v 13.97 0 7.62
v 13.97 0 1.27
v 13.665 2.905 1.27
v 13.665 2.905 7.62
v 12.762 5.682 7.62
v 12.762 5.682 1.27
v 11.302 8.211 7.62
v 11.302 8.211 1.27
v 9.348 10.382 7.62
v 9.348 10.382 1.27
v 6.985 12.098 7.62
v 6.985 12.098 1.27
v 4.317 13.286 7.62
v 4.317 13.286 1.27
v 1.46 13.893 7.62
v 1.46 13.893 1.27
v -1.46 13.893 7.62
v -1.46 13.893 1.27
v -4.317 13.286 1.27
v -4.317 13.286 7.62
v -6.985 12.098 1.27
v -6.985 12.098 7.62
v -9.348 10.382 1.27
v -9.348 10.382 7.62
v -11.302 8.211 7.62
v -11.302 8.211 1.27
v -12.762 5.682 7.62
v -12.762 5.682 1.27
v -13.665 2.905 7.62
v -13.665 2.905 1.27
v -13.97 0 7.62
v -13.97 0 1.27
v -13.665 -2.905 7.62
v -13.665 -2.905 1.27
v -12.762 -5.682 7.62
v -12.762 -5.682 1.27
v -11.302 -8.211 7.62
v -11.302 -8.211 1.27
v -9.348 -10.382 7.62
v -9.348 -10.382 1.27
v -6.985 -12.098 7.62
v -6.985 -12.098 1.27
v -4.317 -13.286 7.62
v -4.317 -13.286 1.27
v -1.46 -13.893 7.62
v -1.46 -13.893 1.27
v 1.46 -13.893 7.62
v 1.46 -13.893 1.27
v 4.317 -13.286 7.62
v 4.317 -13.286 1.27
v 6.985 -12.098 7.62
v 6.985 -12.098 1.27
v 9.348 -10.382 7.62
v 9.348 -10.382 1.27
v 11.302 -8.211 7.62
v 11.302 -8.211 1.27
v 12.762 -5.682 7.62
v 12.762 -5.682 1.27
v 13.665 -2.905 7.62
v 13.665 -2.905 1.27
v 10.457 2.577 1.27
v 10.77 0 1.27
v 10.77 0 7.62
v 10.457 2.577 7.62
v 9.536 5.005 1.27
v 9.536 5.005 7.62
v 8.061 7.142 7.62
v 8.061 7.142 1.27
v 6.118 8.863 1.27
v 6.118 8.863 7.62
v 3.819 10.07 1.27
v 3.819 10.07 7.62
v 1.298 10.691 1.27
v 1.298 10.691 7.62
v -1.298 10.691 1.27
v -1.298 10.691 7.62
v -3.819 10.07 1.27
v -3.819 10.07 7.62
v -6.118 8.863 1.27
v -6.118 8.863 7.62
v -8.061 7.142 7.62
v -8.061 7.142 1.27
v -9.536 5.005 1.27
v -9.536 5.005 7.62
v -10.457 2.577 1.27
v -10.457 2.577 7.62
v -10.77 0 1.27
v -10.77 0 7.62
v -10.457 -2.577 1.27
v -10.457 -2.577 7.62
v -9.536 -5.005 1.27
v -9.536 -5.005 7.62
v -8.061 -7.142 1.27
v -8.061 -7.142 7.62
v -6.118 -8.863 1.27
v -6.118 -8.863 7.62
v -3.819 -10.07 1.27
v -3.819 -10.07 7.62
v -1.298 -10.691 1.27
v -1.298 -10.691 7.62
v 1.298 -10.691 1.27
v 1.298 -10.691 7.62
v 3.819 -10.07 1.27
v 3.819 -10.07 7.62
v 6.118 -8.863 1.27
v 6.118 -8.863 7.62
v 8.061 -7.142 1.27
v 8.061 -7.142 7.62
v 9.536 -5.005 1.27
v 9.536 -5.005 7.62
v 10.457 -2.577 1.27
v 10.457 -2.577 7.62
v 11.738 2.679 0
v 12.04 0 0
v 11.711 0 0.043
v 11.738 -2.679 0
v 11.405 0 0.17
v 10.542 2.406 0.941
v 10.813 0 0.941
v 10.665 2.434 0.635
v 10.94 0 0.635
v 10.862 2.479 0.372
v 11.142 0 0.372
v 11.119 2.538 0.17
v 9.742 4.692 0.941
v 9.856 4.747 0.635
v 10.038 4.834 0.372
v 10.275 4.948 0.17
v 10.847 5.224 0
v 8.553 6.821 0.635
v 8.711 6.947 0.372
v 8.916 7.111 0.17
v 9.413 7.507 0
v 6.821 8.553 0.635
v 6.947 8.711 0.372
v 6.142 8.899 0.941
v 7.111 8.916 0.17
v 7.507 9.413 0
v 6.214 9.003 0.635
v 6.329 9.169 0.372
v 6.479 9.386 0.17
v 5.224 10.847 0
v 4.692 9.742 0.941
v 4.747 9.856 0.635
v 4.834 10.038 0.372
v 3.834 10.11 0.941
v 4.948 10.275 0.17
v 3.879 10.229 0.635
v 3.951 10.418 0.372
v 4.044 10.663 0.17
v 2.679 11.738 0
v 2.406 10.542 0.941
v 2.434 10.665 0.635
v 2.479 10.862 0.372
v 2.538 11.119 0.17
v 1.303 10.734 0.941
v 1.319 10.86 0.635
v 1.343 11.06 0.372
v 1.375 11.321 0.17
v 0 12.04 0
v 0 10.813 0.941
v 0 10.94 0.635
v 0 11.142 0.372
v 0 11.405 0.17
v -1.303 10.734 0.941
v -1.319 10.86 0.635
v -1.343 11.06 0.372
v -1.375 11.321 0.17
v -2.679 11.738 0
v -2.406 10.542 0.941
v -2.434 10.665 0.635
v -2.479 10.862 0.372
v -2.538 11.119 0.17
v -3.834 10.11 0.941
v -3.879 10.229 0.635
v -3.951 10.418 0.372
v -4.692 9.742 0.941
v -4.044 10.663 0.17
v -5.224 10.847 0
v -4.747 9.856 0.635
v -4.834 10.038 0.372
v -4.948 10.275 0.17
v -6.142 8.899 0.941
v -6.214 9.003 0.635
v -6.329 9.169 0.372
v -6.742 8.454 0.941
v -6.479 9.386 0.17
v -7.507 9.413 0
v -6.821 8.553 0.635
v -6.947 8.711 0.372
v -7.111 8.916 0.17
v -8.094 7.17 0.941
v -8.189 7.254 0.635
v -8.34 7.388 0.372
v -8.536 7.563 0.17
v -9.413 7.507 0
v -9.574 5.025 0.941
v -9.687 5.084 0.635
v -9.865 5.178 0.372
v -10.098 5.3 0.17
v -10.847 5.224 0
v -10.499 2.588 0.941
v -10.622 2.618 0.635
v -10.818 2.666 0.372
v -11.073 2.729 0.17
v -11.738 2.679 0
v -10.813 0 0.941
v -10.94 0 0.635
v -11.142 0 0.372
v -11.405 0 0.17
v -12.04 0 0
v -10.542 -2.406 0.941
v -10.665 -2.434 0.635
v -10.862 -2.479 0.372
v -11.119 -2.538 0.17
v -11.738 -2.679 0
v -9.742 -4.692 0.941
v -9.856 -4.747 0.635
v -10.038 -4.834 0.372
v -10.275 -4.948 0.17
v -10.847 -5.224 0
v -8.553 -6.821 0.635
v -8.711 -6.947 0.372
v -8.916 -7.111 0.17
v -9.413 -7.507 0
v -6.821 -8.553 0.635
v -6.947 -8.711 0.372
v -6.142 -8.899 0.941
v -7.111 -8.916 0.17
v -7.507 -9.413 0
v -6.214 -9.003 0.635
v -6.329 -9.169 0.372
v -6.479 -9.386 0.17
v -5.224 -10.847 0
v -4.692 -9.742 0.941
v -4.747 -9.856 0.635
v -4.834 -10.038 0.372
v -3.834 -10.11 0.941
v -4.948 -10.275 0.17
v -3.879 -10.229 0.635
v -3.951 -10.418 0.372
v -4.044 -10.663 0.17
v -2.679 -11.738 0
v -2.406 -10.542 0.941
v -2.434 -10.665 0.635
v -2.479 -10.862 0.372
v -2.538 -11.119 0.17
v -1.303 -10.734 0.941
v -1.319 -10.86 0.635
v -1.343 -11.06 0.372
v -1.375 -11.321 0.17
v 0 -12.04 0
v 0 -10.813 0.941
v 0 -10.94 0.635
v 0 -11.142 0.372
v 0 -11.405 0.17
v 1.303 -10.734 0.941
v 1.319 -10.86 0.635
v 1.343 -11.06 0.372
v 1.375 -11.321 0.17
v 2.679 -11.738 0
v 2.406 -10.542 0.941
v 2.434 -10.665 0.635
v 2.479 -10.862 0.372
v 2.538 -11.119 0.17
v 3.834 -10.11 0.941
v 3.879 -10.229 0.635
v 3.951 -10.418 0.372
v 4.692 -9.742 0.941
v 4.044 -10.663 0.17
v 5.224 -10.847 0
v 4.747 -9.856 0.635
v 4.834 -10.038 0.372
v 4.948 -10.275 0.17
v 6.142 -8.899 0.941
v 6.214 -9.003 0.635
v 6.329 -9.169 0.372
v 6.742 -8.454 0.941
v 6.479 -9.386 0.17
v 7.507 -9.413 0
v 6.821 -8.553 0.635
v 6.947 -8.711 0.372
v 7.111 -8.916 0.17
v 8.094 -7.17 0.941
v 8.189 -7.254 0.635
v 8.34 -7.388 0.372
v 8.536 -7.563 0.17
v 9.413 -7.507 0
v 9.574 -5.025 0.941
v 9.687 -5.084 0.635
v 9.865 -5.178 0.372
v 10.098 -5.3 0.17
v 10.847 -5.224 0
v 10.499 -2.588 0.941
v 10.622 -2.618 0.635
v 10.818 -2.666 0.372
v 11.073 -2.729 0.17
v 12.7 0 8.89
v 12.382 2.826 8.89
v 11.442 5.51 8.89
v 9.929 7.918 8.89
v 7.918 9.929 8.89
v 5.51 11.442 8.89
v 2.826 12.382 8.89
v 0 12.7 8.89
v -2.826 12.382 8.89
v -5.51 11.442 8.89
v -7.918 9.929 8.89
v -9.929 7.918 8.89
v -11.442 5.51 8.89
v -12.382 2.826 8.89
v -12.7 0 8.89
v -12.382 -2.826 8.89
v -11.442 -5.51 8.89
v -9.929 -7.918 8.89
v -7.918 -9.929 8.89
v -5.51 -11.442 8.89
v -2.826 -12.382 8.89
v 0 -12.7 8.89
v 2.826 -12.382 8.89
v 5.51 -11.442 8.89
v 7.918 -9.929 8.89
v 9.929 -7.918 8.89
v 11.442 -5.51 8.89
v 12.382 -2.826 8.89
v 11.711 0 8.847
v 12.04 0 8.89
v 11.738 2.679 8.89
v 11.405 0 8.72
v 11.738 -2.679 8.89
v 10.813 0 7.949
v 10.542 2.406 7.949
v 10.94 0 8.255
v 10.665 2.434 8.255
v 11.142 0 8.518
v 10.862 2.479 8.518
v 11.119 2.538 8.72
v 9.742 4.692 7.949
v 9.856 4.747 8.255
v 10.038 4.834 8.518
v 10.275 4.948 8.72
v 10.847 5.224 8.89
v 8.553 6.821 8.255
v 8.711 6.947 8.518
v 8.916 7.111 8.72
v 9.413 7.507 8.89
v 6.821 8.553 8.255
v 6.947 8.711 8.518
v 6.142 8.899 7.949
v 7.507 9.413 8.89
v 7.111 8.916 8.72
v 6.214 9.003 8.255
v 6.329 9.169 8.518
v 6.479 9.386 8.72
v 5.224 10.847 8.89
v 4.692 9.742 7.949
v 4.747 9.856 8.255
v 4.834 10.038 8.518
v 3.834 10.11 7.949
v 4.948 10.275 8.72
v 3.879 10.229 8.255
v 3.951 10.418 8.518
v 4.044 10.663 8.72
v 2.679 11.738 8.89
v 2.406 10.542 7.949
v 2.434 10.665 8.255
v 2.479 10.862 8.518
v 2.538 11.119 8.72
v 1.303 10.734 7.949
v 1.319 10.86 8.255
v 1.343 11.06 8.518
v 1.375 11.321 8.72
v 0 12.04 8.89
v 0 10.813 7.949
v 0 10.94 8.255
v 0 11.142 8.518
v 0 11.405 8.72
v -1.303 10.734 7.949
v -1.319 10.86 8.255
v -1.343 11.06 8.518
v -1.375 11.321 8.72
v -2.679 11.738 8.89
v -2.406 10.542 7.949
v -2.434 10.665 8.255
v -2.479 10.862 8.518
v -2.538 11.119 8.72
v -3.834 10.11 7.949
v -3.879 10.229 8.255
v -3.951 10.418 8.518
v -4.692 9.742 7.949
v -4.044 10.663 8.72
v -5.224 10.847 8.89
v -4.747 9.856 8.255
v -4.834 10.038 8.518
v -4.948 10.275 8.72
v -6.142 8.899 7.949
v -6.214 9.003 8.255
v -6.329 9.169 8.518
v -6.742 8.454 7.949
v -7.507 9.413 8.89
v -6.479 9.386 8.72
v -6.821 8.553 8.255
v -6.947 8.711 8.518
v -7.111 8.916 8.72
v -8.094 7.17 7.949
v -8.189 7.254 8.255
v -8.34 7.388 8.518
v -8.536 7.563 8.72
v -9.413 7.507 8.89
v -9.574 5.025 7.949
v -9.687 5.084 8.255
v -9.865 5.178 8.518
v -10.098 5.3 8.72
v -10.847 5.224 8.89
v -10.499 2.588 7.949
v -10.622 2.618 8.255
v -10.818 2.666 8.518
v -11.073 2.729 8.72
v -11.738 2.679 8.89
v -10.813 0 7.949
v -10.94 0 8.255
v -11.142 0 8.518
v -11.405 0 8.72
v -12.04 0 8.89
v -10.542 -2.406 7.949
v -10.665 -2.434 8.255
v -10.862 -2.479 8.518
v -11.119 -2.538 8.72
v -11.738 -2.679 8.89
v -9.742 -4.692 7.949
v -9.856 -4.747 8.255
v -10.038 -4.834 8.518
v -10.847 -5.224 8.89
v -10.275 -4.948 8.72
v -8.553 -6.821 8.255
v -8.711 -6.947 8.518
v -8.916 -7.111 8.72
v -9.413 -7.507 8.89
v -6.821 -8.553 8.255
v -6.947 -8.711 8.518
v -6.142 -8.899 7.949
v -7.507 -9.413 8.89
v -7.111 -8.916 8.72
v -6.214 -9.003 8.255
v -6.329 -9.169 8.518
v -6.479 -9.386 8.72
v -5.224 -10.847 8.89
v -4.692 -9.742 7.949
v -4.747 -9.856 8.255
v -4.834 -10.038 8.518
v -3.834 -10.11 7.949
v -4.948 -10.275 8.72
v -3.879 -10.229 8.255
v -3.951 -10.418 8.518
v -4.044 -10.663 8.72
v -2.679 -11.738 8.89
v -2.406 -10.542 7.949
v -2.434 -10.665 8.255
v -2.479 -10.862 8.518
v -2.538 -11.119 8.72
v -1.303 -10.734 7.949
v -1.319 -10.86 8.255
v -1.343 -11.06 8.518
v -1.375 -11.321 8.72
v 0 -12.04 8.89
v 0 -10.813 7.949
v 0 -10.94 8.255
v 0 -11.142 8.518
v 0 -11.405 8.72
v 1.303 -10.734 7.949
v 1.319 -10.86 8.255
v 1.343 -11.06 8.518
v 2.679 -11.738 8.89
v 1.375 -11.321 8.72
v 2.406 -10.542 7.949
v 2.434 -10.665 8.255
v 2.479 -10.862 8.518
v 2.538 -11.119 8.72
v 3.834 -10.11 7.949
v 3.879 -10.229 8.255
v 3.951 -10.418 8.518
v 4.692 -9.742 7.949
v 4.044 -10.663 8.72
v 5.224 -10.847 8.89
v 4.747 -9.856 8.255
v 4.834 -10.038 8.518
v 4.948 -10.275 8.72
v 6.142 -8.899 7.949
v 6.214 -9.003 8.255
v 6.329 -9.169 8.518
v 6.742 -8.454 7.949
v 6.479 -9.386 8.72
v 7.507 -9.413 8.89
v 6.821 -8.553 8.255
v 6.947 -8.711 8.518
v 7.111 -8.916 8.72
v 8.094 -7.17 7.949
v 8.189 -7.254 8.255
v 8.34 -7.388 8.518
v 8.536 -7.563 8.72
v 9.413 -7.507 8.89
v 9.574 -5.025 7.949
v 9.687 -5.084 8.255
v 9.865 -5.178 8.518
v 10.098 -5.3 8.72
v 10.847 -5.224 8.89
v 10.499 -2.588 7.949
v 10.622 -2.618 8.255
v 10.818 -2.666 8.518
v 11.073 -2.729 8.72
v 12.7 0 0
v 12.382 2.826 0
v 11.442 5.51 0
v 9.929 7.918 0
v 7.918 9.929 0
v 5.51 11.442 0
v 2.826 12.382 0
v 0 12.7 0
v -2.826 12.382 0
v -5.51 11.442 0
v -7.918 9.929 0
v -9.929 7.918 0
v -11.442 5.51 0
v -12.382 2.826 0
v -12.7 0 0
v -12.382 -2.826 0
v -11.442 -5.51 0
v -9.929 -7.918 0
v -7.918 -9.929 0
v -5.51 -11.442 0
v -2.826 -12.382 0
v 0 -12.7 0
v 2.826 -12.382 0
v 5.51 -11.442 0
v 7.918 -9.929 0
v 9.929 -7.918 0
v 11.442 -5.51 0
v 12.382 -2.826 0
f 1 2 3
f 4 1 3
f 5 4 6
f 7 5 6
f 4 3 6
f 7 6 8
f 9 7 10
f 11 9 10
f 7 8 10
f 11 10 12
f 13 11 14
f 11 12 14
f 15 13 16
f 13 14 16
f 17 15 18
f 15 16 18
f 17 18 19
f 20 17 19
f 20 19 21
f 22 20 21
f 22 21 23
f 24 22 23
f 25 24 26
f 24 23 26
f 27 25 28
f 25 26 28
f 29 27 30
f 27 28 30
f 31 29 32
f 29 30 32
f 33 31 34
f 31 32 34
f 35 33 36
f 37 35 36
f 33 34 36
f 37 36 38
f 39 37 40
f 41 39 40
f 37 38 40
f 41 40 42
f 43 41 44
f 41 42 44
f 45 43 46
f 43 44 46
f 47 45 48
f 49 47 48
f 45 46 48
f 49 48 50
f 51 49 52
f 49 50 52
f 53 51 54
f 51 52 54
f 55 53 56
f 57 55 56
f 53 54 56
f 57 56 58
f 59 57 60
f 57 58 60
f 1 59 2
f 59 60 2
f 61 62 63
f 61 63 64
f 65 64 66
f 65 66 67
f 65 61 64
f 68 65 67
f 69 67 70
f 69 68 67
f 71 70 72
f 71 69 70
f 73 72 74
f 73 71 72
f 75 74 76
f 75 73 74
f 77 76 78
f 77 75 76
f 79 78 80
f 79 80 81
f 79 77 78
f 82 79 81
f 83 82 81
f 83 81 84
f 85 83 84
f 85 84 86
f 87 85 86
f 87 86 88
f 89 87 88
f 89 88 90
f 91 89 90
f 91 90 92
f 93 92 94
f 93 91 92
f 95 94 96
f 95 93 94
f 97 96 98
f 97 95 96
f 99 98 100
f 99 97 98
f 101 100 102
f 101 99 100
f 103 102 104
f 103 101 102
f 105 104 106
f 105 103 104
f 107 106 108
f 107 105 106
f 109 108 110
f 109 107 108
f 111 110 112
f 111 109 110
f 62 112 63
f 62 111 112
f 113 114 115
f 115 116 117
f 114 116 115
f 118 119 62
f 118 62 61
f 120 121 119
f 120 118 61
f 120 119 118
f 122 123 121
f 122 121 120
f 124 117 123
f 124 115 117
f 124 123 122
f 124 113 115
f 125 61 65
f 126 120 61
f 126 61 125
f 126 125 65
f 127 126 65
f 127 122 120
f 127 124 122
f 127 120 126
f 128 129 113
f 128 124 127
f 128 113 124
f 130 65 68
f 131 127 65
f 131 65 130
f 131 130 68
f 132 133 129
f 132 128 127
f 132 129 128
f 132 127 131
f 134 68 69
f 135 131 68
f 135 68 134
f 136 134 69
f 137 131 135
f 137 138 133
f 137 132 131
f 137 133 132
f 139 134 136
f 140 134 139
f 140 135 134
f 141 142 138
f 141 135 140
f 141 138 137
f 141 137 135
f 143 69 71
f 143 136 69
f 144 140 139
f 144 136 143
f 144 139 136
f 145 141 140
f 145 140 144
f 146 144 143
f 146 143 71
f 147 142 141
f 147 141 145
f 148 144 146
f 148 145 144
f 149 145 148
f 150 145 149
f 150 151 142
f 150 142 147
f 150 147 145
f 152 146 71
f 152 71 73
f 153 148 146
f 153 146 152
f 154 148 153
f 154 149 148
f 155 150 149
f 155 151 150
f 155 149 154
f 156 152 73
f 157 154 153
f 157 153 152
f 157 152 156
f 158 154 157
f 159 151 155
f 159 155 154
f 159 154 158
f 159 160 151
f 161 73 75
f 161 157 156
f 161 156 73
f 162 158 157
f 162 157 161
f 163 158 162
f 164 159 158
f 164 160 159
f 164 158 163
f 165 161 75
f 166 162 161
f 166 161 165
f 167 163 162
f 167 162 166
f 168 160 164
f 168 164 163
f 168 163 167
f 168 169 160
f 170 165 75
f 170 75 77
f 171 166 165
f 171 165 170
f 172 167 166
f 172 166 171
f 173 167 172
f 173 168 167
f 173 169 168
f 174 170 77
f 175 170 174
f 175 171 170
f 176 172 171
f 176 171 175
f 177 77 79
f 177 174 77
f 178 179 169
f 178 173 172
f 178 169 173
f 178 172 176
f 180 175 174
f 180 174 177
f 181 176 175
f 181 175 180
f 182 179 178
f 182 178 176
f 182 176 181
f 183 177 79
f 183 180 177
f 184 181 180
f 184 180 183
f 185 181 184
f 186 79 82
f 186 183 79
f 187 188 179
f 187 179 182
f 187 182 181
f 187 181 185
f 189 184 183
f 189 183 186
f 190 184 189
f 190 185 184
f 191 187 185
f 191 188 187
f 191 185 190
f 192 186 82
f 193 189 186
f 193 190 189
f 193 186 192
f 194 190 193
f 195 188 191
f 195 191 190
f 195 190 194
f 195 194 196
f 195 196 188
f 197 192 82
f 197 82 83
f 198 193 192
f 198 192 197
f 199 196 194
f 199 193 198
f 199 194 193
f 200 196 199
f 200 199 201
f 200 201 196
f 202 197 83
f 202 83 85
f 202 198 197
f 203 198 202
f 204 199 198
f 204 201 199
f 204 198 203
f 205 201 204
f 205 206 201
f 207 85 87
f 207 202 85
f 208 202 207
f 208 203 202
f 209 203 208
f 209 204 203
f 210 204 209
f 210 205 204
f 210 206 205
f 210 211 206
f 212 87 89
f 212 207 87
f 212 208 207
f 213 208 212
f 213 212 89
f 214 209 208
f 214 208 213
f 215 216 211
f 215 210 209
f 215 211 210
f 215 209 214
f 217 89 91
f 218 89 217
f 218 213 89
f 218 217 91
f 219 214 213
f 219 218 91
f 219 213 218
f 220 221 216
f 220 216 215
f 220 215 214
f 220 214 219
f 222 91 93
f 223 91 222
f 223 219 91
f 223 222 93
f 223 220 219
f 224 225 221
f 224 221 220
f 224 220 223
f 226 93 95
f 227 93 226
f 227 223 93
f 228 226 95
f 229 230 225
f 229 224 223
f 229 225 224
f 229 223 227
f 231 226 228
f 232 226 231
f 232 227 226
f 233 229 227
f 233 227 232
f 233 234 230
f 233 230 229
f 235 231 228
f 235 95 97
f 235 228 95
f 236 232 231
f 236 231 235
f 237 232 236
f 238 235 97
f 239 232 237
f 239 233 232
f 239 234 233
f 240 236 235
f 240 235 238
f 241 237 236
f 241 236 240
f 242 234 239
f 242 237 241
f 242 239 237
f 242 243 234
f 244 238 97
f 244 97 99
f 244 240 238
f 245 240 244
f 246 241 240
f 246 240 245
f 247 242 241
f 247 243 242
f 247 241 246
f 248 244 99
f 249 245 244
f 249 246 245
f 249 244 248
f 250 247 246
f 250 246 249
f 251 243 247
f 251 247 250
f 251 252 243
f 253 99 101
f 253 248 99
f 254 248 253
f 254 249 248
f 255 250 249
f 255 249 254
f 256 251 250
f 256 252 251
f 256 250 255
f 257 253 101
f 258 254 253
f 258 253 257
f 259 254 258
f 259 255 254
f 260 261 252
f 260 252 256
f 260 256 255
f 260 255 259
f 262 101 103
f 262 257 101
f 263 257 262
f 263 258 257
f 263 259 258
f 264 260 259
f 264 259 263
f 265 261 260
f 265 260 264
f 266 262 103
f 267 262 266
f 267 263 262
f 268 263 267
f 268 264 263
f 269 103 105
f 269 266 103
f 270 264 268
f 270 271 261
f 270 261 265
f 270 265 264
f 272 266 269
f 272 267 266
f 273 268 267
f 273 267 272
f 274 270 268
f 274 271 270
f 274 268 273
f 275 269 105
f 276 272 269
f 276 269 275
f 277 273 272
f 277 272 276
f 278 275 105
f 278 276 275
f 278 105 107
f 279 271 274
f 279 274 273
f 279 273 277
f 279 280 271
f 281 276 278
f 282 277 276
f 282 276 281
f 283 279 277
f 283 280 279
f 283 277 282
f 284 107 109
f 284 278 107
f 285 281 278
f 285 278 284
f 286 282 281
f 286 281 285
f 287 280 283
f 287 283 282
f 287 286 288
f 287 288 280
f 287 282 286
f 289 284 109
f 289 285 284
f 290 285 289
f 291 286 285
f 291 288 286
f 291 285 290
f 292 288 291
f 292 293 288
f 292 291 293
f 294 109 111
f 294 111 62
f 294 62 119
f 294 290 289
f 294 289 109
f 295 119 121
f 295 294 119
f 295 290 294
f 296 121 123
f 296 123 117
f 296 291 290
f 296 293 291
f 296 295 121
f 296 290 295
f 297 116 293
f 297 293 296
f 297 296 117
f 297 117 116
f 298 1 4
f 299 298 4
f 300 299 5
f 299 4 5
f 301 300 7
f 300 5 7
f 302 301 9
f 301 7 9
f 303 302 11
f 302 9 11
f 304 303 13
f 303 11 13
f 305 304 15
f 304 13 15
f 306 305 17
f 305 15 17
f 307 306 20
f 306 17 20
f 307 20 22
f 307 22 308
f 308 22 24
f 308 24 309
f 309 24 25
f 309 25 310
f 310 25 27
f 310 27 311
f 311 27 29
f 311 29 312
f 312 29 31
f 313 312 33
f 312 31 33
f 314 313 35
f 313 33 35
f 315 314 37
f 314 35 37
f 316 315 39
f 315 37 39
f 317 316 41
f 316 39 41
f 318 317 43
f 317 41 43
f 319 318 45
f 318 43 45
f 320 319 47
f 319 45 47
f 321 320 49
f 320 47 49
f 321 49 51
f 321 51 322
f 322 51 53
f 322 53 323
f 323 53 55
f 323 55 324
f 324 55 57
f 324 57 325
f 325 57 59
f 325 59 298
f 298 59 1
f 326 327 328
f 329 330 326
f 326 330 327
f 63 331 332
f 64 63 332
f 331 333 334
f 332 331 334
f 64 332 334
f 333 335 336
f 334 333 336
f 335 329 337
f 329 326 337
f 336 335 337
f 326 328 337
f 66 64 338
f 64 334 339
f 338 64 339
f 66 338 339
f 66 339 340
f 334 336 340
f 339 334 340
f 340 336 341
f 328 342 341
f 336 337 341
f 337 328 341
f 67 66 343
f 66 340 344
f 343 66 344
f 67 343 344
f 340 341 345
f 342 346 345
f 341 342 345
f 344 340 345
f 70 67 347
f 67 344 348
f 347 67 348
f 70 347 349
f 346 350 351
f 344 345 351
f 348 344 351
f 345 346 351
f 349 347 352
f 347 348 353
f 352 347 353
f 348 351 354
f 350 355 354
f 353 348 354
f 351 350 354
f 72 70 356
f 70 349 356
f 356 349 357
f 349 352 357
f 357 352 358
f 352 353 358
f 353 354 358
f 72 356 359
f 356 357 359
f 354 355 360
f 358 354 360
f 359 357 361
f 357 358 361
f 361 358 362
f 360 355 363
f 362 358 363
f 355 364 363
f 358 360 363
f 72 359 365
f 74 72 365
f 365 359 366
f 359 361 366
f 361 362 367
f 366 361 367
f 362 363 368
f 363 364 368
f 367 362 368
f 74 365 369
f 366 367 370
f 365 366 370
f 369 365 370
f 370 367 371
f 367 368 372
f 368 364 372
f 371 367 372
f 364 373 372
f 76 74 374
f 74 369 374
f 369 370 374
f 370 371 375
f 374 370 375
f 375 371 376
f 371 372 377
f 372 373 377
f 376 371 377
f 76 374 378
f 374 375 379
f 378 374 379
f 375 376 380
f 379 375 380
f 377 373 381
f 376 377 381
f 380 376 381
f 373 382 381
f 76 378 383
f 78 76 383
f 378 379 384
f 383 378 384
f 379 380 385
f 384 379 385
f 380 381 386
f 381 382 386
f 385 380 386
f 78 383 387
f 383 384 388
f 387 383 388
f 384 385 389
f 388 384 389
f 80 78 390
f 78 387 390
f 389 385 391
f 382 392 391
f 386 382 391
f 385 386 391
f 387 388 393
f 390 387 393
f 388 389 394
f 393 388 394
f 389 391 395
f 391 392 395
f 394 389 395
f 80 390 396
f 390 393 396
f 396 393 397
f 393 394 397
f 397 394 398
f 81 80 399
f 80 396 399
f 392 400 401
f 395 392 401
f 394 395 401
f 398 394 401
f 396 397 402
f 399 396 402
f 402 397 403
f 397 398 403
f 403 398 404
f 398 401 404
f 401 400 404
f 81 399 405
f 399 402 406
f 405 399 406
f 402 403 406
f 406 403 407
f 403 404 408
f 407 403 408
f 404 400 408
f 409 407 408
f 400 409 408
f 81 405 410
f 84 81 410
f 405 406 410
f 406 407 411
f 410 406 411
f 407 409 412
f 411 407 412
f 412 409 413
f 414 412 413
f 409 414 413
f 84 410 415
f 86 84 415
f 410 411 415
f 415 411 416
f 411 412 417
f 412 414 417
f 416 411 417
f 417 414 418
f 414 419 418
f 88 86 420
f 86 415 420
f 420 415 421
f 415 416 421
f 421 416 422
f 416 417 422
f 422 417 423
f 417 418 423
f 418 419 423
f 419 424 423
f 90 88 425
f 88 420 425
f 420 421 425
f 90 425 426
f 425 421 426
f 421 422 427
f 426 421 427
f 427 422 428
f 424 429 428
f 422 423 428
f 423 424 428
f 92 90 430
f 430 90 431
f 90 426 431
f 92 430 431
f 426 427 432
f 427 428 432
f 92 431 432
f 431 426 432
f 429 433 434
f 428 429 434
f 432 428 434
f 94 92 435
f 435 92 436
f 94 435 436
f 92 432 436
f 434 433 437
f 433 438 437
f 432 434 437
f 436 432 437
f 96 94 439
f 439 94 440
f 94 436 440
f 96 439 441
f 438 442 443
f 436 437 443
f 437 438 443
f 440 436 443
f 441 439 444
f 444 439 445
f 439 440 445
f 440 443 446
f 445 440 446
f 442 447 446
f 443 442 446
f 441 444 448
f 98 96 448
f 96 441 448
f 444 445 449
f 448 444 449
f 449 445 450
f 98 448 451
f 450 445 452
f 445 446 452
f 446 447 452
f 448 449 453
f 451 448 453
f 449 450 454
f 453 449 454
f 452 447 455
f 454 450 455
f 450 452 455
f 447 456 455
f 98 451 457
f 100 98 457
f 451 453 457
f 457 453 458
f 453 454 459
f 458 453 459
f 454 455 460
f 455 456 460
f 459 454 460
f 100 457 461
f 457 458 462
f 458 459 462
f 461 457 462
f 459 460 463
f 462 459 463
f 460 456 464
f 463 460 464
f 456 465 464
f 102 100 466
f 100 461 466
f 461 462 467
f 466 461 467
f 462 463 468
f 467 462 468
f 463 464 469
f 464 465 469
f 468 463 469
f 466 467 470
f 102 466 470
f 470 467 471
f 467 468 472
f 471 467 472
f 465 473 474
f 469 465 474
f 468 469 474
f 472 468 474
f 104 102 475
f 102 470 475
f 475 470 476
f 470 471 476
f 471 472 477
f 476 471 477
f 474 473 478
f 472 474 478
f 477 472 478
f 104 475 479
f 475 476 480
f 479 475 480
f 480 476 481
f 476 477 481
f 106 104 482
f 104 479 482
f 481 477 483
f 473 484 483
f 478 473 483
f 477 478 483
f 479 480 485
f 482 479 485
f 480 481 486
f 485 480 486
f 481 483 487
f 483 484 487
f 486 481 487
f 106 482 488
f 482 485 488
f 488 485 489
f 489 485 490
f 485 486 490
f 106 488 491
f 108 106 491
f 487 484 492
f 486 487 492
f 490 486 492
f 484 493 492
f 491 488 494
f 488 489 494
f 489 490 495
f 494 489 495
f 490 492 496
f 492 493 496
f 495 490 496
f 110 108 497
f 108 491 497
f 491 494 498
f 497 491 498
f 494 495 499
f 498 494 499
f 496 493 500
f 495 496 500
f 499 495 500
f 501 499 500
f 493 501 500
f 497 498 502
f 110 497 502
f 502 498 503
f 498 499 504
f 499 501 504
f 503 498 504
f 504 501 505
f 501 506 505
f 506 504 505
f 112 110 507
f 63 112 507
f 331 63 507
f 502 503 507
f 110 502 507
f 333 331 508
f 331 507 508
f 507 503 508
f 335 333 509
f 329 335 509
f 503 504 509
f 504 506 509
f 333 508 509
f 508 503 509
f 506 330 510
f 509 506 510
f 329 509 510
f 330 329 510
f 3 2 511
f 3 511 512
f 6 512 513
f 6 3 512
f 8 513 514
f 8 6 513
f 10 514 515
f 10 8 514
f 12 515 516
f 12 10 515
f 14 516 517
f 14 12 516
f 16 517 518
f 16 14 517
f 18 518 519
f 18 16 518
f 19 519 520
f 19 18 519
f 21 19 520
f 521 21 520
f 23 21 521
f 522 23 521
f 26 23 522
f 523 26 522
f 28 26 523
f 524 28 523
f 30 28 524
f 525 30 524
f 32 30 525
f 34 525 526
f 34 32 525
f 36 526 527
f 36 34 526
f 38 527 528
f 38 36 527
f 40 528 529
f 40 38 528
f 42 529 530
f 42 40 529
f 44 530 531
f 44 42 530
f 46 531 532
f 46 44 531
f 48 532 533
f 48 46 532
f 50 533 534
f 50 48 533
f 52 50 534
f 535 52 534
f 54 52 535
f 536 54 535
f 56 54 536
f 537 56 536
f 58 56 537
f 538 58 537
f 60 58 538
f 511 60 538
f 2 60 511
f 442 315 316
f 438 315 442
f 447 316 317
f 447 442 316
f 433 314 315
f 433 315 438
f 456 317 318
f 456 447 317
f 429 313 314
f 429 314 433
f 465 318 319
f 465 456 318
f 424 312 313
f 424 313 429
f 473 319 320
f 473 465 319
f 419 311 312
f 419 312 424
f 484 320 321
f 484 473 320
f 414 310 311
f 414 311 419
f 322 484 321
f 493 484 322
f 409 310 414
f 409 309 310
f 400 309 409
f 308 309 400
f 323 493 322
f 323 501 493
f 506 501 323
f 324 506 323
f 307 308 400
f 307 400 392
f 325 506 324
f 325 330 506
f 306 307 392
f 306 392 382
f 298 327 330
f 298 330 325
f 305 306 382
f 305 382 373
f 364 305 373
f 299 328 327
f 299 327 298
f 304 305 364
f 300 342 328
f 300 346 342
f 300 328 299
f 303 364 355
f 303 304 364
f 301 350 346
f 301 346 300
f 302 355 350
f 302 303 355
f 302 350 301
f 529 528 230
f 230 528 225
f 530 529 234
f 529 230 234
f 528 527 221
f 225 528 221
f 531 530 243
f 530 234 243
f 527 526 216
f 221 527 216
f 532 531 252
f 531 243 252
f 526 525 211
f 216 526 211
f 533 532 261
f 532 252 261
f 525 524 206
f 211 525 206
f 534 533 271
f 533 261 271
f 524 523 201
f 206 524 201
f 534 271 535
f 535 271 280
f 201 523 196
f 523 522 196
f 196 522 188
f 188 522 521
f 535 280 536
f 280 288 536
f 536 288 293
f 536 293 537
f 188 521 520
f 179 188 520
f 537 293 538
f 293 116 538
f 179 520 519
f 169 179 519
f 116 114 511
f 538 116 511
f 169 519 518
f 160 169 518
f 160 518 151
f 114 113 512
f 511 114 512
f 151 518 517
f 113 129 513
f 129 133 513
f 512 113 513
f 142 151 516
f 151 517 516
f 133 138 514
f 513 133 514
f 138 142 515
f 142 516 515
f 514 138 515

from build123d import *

# Parameters (mm, degrees)
F0_R     = 13.97
F0_R_2   = 10.7696
F1_DEPTH = 8.89
F2_R     = 1.27
F3_SIZE  = 1.27


with BuildPart() as f1:
    # F0 (on Top) → F1 (new body)
    with BuildSketch(Plane.XY):
        Circle(F0_R)
        Circle(F0_R_2, mode=Mode.SUBTRACT)
    extrude(amount=F1_DEPTH)

    # F2
    f2_edges = [f1.edges().sort_by_distance(p)[0] for p in [
        (-10.7696, 0, 8.89),
        (-10.7696, 0, 0),
    ]]
    fillet(f2_edges, radius=F2_R)

    # F3
    f3_edges = [f1.edges().sort_by_distance(p)[0] for p in [
        (13.97, 0, 4.445),
        (-13.97, 0, 0),
        (-13.97, 0, 8.89),
    ]]
    chamfer(f3_edges, length=F3_SIZE)


solid = f1.part
